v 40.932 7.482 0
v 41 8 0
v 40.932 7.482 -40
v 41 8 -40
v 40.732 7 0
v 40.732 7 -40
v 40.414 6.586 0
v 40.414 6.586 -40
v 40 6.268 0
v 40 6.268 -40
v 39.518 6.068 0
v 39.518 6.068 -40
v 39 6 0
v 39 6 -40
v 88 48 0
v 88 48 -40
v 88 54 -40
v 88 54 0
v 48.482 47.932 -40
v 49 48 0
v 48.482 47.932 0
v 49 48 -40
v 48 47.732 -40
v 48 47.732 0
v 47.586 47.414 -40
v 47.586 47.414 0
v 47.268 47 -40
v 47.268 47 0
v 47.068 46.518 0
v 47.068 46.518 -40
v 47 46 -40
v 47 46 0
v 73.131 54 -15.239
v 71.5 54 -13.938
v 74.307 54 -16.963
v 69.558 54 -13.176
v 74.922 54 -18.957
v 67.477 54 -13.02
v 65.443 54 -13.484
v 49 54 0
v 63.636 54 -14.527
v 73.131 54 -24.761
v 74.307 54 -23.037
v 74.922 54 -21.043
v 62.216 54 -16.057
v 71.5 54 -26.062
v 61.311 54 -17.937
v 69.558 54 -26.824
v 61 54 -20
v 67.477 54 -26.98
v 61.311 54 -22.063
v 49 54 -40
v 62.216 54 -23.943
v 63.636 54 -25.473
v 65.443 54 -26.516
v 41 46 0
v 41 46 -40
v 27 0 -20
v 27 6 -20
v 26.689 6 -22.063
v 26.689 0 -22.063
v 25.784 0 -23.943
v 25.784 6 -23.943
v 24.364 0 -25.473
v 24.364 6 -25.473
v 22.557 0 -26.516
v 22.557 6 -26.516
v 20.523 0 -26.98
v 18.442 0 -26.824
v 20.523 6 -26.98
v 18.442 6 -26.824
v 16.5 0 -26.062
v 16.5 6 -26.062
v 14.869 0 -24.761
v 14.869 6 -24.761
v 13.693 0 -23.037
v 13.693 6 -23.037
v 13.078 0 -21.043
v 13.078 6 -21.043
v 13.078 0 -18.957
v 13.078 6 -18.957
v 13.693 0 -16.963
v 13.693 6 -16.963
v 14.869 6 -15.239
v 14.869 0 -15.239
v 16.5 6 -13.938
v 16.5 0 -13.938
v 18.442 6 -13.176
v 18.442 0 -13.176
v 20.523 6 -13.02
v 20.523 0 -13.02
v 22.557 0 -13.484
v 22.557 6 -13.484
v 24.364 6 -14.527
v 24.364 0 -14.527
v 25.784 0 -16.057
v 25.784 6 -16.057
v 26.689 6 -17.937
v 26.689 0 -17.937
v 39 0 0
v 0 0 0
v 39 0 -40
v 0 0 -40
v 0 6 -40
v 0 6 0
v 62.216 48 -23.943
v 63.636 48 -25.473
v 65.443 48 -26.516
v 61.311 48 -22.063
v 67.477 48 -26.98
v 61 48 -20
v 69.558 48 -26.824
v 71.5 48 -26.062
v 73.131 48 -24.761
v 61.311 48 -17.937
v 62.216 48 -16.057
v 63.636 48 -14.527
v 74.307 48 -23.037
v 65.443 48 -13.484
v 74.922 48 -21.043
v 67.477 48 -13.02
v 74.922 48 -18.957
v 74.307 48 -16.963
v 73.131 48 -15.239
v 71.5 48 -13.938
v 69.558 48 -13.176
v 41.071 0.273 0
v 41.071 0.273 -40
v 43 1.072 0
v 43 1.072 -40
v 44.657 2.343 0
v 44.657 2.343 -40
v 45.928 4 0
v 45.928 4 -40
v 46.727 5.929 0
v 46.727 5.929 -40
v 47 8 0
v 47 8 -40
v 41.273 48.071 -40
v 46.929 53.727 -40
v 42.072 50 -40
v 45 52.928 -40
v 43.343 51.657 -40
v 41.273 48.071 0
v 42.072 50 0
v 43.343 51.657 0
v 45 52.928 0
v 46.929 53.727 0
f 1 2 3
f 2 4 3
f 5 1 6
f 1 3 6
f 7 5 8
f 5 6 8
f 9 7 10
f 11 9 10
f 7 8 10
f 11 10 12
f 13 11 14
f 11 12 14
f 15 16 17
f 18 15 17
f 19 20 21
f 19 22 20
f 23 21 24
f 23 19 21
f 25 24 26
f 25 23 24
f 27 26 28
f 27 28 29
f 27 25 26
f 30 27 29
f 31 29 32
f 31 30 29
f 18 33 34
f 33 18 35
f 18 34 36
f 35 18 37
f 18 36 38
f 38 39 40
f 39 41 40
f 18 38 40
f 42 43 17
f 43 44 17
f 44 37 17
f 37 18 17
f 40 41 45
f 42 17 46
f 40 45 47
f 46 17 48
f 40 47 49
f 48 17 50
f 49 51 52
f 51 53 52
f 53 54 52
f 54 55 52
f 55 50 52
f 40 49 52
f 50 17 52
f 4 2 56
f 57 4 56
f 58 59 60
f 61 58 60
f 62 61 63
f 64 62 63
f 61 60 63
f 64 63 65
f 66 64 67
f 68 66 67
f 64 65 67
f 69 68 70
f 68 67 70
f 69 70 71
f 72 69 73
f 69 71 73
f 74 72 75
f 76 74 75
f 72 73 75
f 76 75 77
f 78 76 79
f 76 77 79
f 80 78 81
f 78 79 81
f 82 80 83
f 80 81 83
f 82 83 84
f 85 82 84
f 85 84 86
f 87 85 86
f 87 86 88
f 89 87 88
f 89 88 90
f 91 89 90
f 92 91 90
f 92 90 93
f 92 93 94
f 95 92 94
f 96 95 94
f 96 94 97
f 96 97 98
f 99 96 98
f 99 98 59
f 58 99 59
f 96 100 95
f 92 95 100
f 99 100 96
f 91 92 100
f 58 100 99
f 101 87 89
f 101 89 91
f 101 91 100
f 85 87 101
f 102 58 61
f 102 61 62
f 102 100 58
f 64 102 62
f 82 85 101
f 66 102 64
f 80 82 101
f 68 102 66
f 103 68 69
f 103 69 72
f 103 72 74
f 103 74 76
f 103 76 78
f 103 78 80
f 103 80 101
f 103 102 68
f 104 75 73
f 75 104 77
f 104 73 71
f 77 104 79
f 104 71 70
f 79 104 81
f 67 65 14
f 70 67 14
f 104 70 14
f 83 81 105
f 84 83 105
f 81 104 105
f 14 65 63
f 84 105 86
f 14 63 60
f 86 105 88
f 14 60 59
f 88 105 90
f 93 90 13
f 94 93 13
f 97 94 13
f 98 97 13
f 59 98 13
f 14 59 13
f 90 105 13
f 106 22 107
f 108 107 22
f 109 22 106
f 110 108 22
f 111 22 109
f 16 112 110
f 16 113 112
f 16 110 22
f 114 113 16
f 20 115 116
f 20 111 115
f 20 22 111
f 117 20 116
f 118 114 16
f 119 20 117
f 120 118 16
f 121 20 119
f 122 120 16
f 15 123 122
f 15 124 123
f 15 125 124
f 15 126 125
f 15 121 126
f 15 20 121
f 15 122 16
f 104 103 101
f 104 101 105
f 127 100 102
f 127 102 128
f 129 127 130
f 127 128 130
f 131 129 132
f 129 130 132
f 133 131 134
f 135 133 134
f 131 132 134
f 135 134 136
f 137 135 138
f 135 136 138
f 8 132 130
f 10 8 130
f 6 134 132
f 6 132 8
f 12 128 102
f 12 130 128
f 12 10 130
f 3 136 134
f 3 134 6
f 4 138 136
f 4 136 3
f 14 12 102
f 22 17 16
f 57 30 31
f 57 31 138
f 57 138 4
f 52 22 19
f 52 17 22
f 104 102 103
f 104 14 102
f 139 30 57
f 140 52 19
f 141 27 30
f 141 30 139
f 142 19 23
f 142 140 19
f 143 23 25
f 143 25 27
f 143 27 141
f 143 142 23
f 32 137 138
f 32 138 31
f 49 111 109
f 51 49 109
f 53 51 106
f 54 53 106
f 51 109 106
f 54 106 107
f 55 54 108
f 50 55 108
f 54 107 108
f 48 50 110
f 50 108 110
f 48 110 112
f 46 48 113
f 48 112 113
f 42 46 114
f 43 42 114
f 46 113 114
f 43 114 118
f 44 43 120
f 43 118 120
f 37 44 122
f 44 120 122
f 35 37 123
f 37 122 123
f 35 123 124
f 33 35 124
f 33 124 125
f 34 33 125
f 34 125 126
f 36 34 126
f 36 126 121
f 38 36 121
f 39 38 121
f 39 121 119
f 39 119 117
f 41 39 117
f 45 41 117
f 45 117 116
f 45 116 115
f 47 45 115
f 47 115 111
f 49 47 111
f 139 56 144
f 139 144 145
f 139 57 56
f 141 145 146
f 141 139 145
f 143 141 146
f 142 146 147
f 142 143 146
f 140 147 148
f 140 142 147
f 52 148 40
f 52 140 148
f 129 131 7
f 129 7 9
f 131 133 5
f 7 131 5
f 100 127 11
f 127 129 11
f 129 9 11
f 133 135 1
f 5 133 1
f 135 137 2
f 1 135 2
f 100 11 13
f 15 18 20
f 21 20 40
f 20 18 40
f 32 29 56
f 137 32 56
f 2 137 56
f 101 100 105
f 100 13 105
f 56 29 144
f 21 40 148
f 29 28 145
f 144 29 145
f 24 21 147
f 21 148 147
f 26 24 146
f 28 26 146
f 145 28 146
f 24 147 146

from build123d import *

# Parameters (mm, degrees)
SKETCH1_W                      = 88
SKETCH1_H                      = 54
BOSS_EXTRUDE1_DEPTH            = 40
SKETCH2_W                      = 41
SKETCH2_H                      = 48
CUT_EXTRUDE1_DEPTH             = 41
SKETCH3_W                      = 41
SKETCH3_H                      = 48
CUT_EXTRUDE2_DEPTH             = 41
F_14_0_14_DIAMETER_HOLE1_D     = 14
F_14_0_14_DIAMETER_HOLE1_DEPTH = 54
F_14_0_14_DIAMETER_HOLE2_D     = 14
F_14_0_14_DIAMETER_HOLE2_DEPTH = 54
FILLET1_R                      = 2
FILLET2_R                      = 8


with BuildPart() as part:
    # Sketch1 → Boss-Extrude1 (new body)
    with BuildSketch(Plane(origin=(0, 0, -40), x_dir=(-1, 0, 0), z_dir=(0, 0, -1))):
        with Locations((-44, 27)):
            Rectangle(SKETCH1_W, SKETCH1_H)
    extrude(amount=-BOSS_EXTRUDE1_DEPTH)

    # Sketch2 → Cut-Extrude1 (cut, through all)
    with BuildSketch(Plane.XY):
        with Locations((20.5, 30)):
            Rectangle(SKETCH2_W, SKETCH2_H)
    extrude(amount=-CUT_EXTRUDE1_DEPTH, mode=Mode.SUBTRACT)

    # Sketch3 → Cut-Extrude2 (cut, through all)
    with BuildSketch(Plane.XY):
        with Locations((67.5, 24)):
            Rectangle(SKETCH3_W, SKETCH3_H)
    extrude(amount=-CUT_EXTRUDE2_DEPTH, mode=Mode.SUBTRACT)

    # Ø14.0 (14) Diameter Hole1
    with Locations(Plane(origin=(0, 0, 0), x_dir=(-1, 0, 0), z_dir=(0, -1, 0))):
        with Locations((-20, 20)):
            Hole(F_14_0_14_DIAMETER_HOLE1_D / 2, depth=F_14_0_14_DIAMETER_HOLE1_DEPTH)

    # Ø14.0 (14) Diameter Hole2
    with Locations(Plane(origin=(0, 54, 0), x_dir=(1, 0, 0), z_dir=(0, 1, 0))):
        with Locations((68, 20)):
            Hole(F_14_0_14_DIAMETER_HOLE2_D / 2, depth=F_14_0_14_DIAMETER_HOLE2_DEPTH)

    # Fillet1
    fillet1_edges = [part.edges().sort_by_distance(p)[0] for p in [
        (41, 6, -20),
        (47, 48, -20),
    ]]
    fillet(fillet1_edges, radius=FILLET1_R)

    # Fillet2
    fillet2_edges = [part.edges().sort_by_distance(p)[0] for p in [
        (41, 54, -20),
        (47, 0, -20),
    ]]
    fillet(fillet2_edges, radius=FILLET2_R)


solid = part.part
